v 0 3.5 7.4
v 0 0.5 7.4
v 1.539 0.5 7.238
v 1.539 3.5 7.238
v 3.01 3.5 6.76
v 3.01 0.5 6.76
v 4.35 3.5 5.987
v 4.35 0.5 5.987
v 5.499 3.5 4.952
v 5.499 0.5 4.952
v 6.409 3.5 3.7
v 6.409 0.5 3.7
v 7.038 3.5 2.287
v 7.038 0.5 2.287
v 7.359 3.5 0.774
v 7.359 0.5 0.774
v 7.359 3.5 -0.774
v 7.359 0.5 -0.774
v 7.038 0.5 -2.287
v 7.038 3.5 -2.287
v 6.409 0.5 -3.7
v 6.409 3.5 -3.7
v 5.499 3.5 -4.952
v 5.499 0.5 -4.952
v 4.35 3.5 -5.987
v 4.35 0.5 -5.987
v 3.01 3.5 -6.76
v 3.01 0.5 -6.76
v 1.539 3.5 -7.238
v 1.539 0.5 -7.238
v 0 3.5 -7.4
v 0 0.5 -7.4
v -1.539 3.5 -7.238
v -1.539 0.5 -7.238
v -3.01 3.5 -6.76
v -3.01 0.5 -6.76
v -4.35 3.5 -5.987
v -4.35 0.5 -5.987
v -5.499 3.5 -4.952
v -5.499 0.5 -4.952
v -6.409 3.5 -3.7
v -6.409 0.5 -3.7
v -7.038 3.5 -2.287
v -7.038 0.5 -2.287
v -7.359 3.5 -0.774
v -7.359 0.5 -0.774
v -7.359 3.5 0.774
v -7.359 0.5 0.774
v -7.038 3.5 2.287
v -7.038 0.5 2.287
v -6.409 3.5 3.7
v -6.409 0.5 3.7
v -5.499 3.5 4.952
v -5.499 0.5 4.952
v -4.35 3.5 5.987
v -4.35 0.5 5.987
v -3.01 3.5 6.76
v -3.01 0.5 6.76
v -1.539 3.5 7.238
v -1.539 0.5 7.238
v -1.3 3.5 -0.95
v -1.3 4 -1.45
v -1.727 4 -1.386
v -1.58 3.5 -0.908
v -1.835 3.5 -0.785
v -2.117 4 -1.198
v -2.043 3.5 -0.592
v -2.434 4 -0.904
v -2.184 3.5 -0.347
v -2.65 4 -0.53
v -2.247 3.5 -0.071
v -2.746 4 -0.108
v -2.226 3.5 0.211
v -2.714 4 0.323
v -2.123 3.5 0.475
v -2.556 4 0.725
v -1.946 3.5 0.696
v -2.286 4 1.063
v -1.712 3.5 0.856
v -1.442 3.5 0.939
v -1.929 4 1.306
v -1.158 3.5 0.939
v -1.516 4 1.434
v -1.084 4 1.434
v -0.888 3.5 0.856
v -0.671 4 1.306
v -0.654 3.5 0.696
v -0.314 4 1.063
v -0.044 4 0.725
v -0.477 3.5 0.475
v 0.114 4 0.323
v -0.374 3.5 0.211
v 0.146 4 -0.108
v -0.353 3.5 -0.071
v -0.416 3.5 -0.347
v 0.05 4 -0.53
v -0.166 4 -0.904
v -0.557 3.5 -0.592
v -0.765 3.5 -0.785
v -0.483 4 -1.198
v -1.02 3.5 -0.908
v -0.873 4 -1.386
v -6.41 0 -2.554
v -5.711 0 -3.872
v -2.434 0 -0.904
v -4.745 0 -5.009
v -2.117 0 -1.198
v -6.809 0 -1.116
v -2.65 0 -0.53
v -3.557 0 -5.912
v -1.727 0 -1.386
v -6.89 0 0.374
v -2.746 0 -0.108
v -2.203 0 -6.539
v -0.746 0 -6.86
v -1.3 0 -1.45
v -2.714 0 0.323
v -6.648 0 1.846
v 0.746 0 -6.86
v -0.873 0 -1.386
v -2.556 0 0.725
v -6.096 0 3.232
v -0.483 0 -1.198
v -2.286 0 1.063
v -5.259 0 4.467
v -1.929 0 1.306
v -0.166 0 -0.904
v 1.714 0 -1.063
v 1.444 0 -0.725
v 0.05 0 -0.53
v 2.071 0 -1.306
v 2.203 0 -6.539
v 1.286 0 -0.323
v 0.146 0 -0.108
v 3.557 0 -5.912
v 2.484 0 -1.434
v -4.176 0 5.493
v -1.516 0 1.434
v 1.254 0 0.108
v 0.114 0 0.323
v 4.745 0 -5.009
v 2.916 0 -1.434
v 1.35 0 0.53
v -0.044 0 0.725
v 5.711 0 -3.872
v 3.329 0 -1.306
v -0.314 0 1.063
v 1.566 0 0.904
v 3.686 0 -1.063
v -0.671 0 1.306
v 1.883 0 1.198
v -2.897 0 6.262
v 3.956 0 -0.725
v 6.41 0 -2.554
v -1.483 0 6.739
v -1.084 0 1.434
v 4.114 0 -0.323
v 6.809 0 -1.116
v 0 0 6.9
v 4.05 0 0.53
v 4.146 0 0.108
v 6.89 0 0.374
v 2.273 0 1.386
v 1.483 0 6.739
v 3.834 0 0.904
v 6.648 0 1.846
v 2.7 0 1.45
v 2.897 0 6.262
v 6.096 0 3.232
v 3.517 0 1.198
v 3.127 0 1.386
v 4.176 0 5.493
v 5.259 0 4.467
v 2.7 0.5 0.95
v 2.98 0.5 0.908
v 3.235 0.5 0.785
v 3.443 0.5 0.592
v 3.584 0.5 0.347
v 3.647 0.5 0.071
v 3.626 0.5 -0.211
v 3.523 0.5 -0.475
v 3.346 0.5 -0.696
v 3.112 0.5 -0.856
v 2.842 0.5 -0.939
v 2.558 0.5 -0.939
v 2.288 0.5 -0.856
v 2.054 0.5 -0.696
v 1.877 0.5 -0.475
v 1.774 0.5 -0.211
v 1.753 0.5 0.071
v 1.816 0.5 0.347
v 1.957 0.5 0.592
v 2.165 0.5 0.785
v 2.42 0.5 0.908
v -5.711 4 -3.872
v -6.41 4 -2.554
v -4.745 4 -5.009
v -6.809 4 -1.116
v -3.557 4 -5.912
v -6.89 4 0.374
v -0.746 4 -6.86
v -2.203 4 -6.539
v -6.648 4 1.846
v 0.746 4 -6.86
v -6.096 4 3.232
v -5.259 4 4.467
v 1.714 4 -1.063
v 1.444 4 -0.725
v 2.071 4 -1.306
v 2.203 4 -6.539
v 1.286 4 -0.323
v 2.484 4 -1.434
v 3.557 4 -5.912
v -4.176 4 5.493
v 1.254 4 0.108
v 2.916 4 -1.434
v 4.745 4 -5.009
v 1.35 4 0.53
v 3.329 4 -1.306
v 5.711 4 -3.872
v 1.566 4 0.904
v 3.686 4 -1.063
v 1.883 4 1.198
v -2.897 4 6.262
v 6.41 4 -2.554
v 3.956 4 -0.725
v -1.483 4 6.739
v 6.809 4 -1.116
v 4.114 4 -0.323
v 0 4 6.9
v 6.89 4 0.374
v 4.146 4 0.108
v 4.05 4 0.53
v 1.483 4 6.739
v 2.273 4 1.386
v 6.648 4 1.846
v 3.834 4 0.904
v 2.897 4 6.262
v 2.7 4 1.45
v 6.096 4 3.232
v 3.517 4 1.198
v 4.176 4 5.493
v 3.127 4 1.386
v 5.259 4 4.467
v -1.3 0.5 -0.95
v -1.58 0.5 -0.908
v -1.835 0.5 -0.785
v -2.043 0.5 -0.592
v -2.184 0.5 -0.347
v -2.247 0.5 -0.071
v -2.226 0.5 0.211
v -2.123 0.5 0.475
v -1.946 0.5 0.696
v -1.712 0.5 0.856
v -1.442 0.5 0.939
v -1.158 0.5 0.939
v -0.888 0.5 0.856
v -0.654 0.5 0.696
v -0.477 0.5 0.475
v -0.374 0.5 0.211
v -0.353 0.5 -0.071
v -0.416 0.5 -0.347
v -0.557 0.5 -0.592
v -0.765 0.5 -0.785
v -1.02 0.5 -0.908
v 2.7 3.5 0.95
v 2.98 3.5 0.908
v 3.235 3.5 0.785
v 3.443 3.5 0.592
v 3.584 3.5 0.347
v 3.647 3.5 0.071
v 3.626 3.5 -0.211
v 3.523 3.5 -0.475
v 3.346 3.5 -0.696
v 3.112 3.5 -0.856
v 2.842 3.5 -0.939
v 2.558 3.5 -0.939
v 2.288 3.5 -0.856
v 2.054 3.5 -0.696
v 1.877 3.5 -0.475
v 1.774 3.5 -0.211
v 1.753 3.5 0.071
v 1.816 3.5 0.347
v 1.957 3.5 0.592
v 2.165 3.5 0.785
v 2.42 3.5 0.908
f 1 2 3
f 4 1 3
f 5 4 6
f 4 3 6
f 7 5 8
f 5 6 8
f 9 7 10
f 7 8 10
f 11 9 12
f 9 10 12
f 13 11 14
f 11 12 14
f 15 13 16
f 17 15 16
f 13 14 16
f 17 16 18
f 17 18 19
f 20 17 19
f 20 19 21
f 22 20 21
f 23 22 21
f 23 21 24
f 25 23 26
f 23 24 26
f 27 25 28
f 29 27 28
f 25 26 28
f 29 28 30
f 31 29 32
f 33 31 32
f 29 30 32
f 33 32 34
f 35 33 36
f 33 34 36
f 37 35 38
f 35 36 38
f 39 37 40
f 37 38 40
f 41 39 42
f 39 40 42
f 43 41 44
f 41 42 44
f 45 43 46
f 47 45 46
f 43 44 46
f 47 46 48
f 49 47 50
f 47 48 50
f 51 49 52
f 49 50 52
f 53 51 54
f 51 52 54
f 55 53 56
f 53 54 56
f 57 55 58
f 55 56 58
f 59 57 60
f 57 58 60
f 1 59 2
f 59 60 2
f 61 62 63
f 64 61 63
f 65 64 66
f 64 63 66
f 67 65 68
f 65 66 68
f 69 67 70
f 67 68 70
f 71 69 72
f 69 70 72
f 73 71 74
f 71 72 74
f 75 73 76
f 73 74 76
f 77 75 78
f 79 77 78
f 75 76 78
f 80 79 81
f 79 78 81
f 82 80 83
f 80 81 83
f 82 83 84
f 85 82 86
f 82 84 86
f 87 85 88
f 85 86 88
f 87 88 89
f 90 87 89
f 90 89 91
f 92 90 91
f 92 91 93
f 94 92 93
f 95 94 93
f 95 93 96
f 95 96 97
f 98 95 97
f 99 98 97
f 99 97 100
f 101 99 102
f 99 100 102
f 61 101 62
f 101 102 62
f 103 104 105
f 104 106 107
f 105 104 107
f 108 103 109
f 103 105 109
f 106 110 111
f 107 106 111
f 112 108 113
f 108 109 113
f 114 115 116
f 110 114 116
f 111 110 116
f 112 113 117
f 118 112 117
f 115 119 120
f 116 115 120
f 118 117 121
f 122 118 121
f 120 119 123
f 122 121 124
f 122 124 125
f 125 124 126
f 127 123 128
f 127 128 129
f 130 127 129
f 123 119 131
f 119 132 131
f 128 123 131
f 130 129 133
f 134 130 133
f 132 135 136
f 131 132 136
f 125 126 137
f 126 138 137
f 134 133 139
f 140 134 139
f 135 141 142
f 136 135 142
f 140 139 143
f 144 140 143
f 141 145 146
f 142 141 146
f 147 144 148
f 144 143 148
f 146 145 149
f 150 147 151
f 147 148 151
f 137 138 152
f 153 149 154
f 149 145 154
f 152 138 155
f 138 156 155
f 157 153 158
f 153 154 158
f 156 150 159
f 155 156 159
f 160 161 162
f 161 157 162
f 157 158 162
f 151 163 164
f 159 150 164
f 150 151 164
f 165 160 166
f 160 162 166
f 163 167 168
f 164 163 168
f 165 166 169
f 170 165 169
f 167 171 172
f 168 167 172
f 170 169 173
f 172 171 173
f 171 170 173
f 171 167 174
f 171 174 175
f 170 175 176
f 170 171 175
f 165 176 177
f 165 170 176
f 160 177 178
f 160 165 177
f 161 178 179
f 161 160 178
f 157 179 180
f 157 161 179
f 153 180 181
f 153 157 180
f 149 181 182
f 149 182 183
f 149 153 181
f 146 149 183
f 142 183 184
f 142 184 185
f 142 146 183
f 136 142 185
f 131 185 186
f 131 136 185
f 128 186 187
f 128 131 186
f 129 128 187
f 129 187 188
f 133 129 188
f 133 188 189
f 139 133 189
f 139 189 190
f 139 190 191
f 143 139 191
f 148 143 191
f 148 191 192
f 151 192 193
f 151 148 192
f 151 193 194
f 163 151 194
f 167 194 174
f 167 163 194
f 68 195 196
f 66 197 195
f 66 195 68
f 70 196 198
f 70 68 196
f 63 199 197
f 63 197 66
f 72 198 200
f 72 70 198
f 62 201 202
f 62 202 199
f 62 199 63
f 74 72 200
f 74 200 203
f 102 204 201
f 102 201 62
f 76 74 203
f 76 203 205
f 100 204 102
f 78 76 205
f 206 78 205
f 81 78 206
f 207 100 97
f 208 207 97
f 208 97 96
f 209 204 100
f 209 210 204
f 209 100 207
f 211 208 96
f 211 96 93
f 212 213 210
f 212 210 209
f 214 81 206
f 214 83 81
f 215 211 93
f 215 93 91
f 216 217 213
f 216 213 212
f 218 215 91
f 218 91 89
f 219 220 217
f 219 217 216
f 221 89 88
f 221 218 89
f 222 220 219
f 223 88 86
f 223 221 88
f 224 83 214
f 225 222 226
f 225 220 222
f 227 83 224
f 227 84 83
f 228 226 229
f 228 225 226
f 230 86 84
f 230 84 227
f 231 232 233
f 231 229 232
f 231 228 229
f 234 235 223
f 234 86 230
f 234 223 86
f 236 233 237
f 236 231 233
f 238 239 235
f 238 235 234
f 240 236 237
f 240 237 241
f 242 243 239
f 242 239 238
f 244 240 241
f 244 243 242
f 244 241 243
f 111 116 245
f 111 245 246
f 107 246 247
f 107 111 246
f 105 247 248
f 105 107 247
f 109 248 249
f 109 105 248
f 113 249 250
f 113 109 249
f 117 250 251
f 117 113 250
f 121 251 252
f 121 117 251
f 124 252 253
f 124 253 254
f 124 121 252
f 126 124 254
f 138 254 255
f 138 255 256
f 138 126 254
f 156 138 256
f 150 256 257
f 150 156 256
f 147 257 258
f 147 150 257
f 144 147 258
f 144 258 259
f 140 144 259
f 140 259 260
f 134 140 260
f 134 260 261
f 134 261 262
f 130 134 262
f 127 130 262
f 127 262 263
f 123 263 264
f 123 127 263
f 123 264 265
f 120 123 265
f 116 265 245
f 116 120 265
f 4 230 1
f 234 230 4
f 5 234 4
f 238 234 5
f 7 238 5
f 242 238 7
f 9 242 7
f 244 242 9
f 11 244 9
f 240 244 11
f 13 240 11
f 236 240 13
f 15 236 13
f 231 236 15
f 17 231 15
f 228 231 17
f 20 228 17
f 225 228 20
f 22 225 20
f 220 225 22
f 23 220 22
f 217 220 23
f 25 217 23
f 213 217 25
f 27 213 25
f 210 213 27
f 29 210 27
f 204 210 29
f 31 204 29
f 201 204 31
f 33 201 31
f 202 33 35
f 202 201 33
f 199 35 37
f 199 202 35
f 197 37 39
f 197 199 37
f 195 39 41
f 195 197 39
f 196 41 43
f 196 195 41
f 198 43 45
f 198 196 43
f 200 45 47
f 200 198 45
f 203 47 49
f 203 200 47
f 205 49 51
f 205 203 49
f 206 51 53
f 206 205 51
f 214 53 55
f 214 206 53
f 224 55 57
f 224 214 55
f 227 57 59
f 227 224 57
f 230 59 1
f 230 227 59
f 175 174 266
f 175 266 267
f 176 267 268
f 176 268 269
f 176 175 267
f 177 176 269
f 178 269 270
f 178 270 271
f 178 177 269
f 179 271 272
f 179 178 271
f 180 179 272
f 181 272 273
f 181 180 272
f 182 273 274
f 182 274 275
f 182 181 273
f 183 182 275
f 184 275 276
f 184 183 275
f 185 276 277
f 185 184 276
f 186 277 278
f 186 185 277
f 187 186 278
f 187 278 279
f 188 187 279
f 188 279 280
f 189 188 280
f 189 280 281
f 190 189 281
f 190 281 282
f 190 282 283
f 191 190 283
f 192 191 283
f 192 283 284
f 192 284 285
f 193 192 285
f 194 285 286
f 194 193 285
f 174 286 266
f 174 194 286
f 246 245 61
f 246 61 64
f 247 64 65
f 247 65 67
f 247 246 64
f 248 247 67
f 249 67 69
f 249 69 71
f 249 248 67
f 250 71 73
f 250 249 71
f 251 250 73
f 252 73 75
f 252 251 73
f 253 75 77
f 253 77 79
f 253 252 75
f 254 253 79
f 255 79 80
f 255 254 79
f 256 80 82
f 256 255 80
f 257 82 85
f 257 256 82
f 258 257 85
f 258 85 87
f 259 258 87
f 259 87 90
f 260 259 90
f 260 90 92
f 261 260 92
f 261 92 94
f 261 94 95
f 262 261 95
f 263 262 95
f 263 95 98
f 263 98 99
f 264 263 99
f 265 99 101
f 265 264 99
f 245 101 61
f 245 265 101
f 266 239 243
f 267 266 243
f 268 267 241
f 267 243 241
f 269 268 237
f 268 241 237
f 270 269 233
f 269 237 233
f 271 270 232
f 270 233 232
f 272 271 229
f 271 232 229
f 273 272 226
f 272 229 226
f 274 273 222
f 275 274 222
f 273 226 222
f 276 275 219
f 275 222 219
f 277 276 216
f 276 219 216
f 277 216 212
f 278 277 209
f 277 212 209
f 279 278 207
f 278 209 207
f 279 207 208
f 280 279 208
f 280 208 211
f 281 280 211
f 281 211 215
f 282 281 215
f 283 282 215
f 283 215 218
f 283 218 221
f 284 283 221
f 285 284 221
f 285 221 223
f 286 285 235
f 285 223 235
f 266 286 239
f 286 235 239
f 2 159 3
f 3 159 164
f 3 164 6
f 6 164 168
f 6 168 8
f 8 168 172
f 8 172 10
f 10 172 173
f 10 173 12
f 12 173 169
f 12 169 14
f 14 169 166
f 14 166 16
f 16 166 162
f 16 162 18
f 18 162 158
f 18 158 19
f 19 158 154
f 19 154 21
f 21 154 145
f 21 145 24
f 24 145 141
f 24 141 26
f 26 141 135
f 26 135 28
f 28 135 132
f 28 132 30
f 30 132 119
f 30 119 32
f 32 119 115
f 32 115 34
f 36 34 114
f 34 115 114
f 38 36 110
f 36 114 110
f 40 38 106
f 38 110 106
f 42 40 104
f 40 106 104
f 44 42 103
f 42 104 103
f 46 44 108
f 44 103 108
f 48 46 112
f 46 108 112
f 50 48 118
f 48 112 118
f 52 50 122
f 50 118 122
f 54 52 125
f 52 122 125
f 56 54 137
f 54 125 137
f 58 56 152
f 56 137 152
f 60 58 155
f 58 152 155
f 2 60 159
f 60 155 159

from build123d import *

# Parameters (mm, degrees)
SKETCH_1_R      = 7.4
SKETCH_1_R_2    = 0.95
EXTRUDE_1_DEPTH = 4
CHAMFER_1_SIZE  = 0.5


with BuildPart() as part:
    # 草图1 → 凸台-拉伸1 (new body)
    with BuildSketch(Plane(origin=(0, 0, 0), x_dir=(1, 0, 0), z_dir=(0, 1, 0))):
        Circle(SKETCH_1_R)
        with Locations((2.7, 0)):
            Circle(SKETCH_1_R_2, mode=Mode.SUBTRACT)
        with Locations((-1.3, 0)):
            Circle(SKETCH_1_R_2, mode=Mode.SUBTRACT)
    extrude(amount=EXTRUDE_1_DEPTH)

    # 倒角1
    chamfer_1_edges = [part.edges().sort_by_distance(p)[0] for p in [
        (-7.4, 0, 0),
        (-7.4, 4, 0),
        (-2.25, 0, 0),
        (1.75, 0, 0),
        (-2.25, 4, 0),
        (1.75, 4, 0),
    ]]
    chamfer(chamfer_1_edges, length=CHAMFER_1_SIZE)


solid = part.part
